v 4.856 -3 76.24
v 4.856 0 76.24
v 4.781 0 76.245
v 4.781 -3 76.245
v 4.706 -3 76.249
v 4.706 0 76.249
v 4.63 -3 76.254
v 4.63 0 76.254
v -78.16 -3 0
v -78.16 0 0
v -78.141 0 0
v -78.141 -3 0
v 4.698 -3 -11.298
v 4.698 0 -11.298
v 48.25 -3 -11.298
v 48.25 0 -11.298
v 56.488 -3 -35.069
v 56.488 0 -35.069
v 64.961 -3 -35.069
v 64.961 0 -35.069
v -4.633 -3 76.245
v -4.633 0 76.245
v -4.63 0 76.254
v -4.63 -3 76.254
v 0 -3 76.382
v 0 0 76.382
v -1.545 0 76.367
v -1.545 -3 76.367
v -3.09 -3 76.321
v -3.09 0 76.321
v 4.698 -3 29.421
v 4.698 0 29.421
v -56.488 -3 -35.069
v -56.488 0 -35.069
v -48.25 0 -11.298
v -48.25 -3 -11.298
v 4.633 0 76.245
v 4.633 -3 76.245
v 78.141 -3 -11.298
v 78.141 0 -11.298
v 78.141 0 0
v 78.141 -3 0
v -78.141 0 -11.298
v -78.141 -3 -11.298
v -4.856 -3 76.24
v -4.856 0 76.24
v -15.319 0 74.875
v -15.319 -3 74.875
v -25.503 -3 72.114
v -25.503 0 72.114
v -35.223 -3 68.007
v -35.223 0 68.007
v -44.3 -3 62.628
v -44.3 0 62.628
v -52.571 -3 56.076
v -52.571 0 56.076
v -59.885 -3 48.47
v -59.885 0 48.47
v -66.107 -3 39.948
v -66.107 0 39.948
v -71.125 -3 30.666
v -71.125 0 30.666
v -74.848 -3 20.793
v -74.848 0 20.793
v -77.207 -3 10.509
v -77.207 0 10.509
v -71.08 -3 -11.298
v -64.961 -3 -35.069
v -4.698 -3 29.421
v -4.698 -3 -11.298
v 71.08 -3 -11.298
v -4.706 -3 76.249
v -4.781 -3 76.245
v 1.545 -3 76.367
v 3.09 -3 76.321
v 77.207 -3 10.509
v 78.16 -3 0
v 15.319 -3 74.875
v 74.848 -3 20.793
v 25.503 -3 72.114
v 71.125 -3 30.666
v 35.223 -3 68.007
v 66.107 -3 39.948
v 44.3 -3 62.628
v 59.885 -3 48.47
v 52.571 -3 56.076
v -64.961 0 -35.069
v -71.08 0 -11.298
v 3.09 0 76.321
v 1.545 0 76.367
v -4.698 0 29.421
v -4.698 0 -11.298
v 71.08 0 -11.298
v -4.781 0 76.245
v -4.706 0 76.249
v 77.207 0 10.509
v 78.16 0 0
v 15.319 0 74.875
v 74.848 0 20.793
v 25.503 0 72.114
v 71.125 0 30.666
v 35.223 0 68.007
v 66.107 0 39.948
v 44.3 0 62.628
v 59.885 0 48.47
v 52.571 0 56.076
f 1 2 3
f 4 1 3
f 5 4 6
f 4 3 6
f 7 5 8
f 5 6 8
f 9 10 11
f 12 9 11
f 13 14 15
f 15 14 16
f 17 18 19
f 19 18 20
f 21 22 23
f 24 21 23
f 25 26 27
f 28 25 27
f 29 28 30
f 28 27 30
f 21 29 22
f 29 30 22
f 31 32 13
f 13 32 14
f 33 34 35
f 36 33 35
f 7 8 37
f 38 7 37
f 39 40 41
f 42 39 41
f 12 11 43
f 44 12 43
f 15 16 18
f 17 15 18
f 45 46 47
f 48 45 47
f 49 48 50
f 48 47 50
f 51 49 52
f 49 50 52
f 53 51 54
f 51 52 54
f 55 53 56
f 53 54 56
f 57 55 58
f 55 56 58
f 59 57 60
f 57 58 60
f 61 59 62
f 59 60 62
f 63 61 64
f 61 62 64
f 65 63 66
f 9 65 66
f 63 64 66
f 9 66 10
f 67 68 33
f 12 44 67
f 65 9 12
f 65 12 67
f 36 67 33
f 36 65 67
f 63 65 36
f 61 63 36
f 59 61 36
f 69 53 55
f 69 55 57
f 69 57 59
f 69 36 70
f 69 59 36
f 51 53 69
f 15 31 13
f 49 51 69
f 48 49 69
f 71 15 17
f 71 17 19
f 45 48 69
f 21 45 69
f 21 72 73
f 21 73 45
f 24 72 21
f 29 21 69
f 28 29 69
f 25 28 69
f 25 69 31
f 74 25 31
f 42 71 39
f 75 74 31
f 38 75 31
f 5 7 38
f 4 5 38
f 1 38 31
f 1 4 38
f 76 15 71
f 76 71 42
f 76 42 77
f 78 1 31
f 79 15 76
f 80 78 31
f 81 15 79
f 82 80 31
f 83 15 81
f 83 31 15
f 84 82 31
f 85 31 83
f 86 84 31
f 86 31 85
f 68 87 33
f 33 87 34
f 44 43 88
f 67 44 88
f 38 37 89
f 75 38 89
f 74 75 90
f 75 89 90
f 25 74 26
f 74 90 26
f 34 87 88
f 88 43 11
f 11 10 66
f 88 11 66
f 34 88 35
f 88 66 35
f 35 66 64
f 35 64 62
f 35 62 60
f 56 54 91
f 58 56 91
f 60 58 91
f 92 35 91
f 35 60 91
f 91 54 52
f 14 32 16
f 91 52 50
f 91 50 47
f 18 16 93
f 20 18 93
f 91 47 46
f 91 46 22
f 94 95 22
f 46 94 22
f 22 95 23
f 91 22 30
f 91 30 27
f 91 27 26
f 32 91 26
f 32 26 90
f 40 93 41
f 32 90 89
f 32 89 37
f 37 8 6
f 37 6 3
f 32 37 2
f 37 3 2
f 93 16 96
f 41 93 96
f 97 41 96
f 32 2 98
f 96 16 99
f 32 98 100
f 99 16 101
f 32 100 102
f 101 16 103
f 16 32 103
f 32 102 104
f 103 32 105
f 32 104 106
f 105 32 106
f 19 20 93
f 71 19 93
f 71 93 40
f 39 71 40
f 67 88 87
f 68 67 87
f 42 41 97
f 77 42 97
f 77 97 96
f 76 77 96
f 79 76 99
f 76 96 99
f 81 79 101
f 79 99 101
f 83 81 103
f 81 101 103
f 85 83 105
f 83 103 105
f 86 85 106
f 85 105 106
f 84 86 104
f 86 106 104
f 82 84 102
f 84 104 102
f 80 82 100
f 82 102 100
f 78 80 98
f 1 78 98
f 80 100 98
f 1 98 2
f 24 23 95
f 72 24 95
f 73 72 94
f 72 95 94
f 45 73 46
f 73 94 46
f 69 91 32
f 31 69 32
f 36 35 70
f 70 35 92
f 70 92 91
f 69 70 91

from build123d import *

# Parameters (mm, degrees)
F1_DEPTH = 3


with BuildPart() as f1:
    # F0 (on Front) → F1 (new body)
    with BuildSketch(Plane.XZ):
        with BuildLine():
            Line((4.633374, 76.245005), (4.698028, 76.063357))
            Line((4.698028, 76.063357), (4.698028, 29.420612))
            Line((4.698028, 29.420612), (4.698028, 0))
            Line((4.698028, 0), (4.698028, -11.297515))
            Line((4.698028, -11.297515), (48.249803, -11.297515))
            Line((48.249803, -11.297515), (71.0802, -11.297515))
            Line((71.0802, -11.297515), (78.141153, -11.297515))
            Line((78.141153, -11.297515), (78.141153, 0))
            Line((78.141153, 0), (78.151679, 0))
            ThreePointArc((78.151679, 0), (56.35158, 52.389486), (4.859137, 76.231273))
            ThreePointArc((4.859137, 76.231273), (4.74626, 76.238221), (4.633374, 76.245005))
        make_face()
        with BuildLine():
            Line((4.698028, 29.420612), (4.698028, 76.063357))
            Line((4.698028, 76.063357), (4.633374, 76.245005))
            ThreePointArc((4.633374, 76.245005), (2.317706, 76.348073), (0, 76.382439))
            ThreePointArc((0, 76.382439), (-2.317706, 76.348073), (-4.633374, 76.245005))
            Line((-4.633374, 76.245005), (-4.698028, 76.063357))
            Line((-4.698028, 76.063357), (-4.698028, 29.420612))
            Line((-4.698028, 29.420612), (0, 29.420612))
            Line((0, 29.420612), (4.698028, 29.420612))
        make_face()
        with BuildLine():
            Line((4.630308, 76.253618), (4.633374, 76.245005))
            ThreePointArc((4.633374, 76.245005), (4.74626, 76.238221), (4.859137, 76.231273))
            Line((4.859137, 76.231273), (4.855918, 76.239906))
            ThreePointArc((4.855918, 76.239906), (4.743118, 76.246843), (4.630308, 76.253618))
        make_face()
        with BuildLine():
            Line((4.855918, 76.239906), (4.859137, 76.231273))
            ThreePointArc((4.859137, 76.231273), (56.35158, 52.389486), (78.151679, 0))
            Line((78.151679, 0), (78.160097, 0))
            ThreePointArc((78.160097, 0), (56.356415, 52.396601), (4.855918, 76.239906))
        make_face()
        with BuildLine():
            Line((-4.698028, 0), (-4.698028, 29.420612))
            Line((-4.698028, 29.420612), (-4.698028, 76.063357))
            Line((-4.698028, 76.063357), (-4.633374, 76.245005))
            ThreePointArc((-4.633374, 76.245005), (-4.74626, 76.238221), (-4.859137, 76.231273))
            ThreePointArc((-4.859137, 76.231273), (-56.35158, 52.389486), (-78.151679, 0))
            Line((-78.151679, 0), (-78.141153, 0))
            Line((-78.141153, 0), (-78.141153, -11.297515))
            Line((-78.141153, -11.297515), (-71.0802, -11.297515))
            Line((-71.0802, -11.297515), (-48.249803, -11.297515))
            Line((-48.249803, -11.297515), (-4.698028, -11.297515))
            Line((-4.698028, -11.297515), (-4.698028, 0))
        make_face()
        with BuildLine():
            ThreePointArc((-4.859137, 76.231273), (-4.74626, 76.238221), (-4.633374, 76.245005))
            Line((-4.633374, 76.245005), (-4.630308, 76.253618))
            ThreePointArc((-4.630308, 76.253618), (-4.743118, 76.246843), (-4.855918, 76.239906))
            Line((-4.855918, 76.239906), (-4.859137, 76.231273))
        make_face()
        Polygon((71.0802, -11.297515), (48.249803, -11.297515), (56.487575, -35.069365), (64.960711, -35.069365), align=None)
        with BuildLine():
            ThreePointArc((-78.151679, 0), (-56.35158, 52.389486), (-4.859137, 76.231273))
            Line((-4.859137, 76.231273), (-4.855918, 76.239906))
            ThreePointArc((-4.855918, 76.239906), (-56.356415, 52.396601), (-78.160097, 0))
            Line((-78.160097, 0), (-78.151679, 0))
        make_face()
        Polygon((-56.487575, -35.069365), (-48.249803, -11.297515), (-71.0802, -11.297515), (-64.960711, -35.069365), align=None)
    extrude(amount=F1_DEPTH)


solid = f1.part
